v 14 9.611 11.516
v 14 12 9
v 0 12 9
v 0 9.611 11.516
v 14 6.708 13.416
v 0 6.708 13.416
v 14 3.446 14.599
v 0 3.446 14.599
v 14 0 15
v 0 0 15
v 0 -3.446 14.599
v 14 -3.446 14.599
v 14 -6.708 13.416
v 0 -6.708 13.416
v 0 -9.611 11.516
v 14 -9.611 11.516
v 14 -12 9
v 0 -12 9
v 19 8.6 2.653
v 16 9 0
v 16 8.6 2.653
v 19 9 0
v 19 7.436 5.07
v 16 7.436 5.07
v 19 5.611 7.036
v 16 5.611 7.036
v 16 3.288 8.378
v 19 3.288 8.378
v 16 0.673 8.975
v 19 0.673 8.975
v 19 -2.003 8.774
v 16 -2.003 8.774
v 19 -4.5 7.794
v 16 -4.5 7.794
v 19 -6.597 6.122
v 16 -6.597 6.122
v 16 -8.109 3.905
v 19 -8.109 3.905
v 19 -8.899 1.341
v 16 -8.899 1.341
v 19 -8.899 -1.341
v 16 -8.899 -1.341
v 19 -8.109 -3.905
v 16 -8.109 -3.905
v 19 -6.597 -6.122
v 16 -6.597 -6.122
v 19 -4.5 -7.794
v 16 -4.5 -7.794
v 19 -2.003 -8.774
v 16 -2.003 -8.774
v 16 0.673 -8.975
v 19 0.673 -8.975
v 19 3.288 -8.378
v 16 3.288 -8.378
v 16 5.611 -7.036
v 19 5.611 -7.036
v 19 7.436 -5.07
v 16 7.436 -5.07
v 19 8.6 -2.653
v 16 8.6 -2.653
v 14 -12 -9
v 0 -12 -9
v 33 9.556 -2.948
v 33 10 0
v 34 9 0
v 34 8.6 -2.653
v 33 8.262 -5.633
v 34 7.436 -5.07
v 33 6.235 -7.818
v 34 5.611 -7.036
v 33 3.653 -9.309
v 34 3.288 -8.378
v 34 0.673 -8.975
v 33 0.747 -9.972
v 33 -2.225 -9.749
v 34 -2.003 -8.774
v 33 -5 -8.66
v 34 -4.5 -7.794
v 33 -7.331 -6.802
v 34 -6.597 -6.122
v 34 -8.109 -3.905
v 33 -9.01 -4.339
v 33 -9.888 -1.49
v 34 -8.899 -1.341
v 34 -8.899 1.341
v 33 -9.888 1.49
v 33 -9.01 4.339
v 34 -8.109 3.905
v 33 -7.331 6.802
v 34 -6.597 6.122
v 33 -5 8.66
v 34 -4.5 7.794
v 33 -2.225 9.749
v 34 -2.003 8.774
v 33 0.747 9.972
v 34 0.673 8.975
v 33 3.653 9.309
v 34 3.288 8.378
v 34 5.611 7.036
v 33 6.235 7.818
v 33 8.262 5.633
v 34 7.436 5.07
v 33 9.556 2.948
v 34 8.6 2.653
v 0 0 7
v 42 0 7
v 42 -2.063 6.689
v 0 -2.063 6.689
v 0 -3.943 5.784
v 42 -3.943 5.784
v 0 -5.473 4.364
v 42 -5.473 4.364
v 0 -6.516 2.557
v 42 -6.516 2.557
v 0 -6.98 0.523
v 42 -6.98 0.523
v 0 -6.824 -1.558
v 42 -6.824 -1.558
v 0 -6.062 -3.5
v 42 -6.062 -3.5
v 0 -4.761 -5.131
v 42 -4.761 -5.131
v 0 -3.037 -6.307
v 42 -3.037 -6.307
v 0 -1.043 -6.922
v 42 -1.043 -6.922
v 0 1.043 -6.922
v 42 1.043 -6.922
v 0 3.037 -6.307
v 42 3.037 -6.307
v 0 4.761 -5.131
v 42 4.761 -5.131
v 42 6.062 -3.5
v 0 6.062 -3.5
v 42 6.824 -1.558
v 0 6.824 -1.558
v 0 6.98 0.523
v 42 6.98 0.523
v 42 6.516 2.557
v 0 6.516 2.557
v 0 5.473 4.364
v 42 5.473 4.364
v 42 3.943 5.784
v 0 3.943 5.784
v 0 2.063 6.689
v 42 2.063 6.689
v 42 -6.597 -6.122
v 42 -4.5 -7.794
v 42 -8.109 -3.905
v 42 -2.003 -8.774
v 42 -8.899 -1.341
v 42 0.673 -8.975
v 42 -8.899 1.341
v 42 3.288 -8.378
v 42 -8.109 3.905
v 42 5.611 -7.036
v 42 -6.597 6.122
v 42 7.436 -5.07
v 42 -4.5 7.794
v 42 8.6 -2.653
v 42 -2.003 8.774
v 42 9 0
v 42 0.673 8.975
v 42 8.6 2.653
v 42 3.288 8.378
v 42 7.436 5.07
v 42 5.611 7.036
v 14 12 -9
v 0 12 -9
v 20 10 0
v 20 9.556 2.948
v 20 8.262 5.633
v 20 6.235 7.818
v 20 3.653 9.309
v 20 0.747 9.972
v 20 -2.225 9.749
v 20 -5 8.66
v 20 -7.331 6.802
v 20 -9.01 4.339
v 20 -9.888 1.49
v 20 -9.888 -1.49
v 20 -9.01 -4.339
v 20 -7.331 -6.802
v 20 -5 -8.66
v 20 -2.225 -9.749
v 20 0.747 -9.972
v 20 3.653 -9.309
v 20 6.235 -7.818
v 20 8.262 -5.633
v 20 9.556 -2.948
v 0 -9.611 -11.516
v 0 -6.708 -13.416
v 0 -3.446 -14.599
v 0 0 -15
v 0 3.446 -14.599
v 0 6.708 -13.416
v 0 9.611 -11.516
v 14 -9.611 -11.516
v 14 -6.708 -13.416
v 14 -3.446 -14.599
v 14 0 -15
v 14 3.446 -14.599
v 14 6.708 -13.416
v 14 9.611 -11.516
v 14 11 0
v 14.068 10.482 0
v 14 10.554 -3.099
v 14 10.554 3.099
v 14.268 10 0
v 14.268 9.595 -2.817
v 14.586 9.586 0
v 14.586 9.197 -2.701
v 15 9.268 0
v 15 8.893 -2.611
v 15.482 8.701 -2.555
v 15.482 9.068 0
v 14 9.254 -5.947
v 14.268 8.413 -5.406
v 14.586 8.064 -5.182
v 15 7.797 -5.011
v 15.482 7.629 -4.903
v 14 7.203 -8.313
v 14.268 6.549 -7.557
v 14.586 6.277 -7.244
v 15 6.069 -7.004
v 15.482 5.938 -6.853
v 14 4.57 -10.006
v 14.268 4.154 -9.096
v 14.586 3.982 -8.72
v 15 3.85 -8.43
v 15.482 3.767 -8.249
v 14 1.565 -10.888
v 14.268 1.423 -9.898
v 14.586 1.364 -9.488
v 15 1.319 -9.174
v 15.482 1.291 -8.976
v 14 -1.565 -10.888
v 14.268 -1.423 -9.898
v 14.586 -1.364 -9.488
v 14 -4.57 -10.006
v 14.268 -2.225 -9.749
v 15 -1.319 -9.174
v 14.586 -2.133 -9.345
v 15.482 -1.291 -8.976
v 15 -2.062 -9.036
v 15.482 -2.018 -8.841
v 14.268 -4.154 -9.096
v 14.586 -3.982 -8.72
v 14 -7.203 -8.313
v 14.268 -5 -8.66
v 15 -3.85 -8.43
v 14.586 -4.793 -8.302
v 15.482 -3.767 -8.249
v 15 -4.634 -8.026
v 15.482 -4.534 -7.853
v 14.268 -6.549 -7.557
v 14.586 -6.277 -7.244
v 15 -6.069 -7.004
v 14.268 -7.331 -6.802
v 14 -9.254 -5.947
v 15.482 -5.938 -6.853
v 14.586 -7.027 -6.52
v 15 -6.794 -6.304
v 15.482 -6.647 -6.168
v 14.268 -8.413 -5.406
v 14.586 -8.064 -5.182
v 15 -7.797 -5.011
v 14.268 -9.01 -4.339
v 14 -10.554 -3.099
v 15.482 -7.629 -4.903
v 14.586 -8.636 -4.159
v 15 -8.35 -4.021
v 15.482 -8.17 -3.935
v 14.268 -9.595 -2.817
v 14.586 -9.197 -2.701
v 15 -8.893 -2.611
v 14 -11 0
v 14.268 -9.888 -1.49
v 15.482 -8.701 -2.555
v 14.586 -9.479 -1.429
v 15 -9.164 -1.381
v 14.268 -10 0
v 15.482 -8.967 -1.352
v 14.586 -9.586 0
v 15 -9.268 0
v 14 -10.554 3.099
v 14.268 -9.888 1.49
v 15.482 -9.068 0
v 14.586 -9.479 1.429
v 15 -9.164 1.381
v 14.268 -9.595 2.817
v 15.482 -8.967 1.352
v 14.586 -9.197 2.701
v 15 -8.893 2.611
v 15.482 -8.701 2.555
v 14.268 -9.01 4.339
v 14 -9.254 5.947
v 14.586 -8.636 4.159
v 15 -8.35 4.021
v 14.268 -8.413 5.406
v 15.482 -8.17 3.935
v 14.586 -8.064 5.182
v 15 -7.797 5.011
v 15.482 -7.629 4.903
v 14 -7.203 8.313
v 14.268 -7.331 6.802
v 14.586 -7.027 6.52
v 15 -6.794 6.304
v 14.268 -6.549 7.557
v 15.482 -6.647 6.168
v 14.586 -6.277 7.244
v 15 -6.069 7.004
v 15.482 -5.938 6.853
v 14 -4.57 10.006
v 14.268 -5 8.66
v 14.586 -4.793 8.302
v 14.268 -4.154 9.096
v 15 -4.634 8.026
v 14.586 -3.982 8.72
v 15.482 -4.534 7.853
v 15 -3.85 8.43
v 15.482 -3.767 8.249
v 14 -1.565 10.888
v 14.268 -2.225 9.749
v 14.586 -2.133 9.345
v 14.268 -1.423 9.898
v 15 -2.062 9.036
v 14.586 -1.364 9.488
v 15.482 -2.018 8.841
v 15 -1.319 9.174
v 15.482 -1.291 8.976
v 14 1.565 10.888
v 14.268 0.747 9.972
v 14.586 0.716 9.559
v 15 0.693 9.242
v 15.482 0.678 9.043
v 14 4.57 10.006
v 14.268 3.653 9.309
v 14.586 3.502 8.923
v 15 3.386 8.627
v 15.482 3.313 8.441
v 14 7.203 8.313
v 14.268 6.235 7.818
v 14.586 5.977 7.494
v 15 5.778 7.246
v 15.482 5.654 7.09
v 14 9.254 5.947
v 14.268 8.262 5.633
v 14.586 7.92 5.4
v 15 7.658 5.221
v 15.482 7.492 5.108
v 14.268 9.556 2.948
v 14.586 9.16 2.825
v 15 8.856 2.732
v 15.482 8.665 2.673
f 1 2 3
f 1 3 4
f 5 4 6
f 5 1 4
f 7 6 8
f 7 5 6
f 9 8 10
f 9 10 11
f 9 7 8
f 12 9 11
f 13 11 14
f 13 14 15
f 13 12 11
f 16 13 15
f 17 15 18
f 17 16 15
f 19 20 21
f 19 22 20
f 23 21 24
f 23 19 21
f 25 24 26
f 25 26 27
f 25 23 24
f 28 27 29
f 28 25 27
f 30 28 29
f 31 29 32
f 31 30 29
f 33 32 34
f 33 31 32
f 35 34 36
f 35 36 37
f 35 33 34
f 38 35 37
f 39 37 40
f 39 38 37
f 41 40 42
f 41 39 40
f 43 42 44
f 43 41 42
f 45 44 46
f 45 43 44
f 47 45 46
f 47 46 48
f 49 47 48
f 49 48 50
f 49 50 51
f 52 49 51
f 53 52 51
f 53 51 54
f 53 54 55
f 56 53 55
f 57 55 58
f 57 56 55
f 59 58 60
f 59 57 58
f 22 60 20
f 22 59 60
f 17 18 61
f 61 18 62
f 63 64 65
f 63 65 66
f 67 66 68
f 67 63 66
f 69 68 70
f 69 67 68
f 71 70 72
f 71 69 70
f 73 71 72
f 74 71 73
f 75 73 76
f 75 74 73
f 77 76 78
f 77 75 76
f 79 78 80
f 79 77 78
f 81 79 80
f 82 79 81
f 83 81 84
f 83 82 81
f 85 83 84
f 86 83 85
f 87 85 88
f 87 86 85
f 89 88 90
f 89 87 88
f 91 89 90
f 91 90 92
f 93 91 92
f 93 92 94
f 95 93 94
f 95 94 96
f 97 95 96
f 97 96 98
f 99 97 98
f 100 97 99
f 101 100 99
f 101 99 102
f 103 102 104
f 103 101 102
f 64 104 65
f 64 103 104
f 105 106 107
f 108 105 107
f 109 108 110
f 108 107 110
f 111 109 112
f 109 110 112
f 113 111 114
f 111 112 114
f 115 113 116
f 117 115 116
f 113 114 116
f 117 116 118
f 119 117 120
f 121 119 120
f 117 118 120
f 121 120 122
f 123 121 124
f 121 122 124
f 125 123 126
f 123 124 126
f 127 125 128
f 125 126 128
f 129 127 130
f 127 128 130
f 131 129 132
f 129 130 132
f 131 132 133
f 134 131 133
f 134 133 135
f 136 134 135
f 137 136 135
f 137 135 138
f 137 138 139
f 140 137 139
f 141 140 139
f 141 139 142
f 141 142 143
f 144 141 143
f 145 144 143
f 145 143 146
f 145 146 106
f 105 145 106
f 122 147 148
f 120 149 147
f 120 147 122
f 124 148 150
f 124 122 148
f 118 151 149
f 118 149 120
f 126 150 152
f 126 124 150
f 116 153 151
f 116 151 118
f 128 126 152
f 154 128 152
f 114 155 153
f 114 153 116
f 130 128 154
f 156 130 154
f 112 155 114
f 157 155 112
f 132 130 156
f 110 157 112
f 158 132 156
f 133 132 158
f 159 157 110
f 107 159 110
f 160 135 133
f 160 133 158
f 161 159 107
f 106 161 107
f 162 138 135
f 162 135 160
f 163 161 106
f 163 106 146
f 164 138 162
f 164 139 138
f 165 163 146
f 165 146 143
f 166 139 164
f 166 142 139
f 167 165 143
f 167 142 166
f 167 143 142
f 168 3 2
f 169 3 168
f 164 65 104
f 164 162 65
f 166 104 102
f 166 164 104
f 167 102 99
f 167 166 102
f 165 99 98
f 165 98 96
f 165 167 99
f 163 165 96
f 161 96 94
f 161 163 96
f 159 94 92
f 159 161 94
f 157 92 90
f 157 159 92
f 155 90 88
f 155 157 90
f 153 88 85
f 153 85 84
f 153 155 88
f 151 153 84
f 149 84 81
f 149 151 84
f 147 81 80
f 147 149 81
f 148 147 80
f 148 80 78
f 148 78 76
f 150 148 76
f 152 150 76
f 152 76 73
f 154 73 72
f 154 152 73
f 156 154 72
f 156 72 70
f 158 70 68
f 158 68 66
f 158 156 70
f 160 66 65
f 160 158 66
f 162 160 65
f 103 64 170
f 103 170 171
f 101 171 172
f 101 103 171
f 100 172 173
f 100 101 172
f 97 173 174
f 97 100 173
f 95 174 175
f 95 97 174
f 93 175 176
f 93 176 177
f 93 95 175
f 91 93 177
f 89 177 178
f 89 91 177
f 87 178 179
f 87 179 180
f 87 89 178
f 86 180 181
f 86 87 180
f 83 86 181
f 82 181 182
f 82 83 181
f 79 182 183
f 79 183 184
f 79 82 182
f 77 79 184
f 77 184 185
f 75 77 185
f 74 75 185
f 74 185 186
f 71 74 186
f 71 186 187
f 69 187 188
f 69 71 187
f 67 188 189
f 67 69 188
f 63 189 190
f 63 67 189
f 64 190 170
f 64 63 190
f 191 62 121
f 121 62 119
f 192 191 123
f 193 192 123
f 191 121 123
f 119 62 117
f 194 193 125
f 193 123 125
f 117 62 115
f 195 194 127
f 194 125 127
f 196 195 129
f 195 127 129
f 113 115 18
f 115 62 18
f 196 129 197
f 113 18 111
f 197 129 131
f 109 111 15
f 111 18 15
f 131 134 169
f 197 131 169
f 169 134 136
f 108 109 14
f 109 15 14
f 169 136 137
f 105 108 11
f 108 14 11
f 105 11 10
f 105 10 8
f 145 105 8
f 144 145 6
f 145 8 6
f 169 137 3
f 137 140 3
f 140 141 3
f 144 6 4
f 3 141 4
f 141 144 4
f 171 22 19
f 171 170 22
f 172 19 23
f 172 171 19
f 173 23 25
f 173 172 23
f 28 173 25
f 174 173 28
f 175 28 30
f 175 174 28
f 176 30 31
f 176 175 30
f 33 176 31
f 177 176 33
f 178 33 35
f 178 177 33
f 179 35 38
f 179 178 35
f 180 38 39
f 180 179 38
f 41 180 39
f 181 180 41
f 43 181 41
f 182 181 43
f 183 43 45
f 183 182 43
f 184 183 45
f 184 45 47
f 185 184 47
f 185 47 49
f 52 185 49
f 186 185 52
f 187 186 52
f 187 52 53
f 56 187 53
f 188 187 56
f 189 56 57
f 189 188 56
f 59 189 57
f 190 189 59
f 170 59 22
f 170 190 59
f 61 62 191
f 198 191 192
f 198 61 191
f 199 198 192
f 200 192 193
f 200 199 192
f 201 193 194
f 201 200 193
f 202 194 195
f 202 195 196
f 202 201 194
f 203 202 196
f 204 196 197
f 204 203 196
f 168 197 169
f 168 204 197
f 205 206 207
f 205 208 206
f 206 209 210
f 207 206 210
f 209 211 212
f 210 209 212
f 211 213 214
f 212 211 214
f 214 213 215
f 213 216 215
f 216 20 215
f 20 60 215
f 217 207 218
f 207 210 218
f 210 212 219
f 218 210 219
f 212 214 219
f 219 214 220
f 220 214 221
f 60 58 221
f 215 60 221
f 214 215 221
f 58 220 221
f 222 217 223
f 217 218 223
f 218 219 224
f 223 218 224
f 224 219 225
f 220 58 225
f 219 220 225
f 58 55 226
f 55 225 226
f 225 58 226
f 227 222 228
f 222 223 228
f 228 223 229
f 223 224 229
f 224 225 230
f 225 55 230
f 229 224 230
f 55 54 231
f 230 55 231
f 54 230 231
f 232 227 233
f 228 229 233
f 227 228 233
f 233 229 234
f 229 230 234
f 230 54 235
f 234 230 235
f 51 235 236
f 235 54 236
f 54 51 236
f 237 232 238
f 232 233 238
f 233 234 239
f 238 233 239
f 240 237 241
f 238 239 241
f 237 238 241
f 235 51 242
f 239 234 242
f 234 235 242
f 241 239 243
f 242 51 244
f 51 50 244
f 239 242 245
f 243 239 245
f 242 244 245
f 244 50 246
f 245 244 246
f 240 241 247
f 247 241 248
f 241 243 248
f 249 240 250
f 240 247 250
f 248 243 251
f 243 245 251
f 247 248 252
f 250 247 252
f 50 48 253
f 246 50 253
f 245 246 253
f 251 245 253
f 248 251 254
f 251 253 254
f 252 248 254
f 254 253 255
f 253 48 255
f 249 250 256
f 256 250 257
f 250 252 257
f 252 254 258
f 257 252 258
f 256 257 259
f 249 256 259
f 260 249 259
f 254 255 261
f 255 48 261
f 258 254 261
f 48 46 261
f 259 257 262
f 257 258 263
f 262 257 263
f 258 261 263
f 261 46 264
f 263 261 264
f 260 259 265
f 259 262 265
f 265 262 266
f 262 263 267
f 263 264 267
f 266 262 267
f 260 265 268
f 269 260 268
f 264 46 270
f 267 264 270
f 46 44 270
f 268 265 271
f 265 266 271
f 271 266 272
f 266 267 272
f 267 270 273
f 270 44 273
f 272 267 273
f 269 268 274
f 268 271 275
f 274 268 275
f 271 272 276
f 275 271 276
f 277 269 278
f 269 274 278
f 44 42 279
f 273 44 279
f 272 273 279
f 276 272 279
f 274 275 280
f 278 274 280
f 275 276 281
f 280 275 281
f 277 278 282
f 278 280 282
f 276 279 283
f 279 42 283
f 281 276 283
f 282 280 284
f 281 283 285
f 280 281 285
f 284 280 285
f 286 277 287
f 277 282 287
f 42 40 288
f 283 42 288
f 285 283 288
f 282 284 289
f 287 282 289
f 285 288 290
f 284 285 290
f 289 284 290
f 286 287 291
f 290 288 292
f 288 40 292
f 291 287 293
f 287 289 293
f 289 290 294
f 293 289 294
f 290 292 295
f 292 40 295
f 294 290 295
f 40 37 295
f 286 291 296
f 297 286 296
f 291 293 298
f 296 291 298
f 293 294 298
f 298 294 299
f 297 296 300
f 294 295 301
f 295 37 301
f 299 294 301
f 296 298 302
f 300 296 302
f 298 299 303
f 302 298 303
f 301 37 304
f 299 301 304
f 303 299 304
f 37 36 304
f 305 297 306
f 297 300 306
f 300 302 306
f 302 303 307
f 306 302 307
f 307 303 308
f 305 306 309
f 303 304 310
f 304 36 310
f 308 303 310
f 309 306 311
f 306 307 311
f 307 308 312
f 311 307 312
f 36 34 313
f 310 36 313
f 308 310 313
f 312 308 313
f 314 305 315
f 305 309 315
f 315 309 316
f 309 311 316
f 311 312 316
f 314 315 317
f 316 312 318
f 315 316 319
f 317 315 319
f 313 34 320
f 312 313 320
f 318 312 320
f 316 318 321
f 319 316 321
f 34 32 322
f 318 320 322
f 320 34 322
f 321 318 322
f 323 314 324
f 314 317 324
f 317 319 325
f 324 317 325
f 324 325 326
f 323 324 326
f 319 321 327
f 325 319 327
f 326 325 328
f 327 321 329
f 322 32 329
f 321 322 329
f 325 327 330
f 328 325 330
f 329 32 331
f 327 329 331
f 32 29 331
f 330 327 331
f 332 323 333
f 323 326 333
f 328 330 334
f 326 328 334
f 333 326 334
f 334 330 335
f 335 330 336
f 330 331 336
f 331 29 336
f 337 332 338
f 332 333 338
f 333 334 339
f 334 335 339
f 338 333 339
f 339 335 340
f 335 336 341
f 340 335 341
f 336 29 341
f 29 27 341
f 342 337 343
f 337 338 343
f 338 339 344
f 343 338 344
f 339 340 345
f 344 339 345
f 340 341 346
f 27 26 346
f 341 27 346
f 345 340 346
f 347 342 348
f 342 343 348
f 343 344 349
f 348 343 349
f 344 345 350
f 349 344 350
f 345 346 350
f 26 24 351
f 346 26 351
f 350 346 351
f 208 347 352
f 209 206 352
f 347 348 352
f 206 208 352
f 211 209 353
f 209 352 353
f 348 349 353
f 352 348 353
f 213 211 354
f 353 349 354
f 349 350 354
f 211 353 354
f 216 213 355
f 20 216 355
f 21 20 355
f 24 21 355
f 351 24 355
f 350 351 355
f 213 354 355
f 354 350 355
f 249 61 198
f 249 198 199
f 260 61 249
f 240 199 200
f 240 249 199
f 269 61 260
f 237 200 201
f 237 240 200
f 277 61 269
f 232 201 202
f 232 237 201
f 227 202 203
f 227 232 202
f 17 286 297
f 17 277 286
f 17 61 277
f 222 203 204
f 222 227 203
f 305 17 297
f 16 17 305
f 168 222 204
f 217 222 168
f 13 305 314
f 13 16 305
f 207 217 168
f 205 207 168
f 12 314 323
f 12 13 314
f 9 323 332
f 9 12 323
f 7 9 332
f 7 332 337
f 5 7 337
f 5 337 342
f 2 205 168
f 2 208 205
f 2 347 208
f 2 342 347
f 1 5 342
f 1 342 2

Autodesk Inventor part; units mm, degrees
ref_plane "YZ Plane" through (0, 0, 0) normal (1, 0, 0) x (0, 1, 0)
ref_plane "XZ Plane" through (0, 0, 0) normal (0, 1, 0) x (-1, 0, 0)
ref_plane "XY Plane" through (0, 0, 0) normal (0, 0, 1) x (1, 0, 0)
sketch "Skizze1" plane through (0, 0, 0) normal (0, 0, 1) x (1, 0, 0)
  line L0 (0, 0) -> (42, 0)
  line L1 (0, 0) -> (0, 15)
  line L2 (0, 15) -> (14, 15)
  line L3 (14, 15) -> (14, 9)
  line L4 (14, 9) -> (19, 9)
  line L5 (19, 9) -> (20, 10)
  line L6 (20, 10) -> (33, 10)
  line L7 (33, 10) -> (34, 9)
  line L8 (34, 9) -> (42, 9)
  line L9 (42, 9) -> (42, 0)
  dimension "d0" = 45
  dimension "d1" = 42
  dimension "d2" = 20
  dimension "d3" = 18
  dimension "d4" = 5
  dimension "d5" = 28
  dimension "d6" = 8
  dimension "d7" = 30
revolve "Umdrehung1" add sketch "Skizze1" angle 360 about axis through (0, 0, 0) along (1, 0, 0)
thread "Gewinde1" size "M20x2.5" class "6g" standard "ISO Metric profile" full length
sketch "Skizze2" plane through (0, 0, 0) normal (-1, 0, 0) x (0, 0, 1)
  circle A0 centre (0, 0) radius 15 projected
hole "Bohrung1" at (0, 0, 0) direction (1, 0, 0) diameter 14 depth 42
sketch "Skizze3" plane through (0, 0, 0) normal (-1, 0, 0) x (0, 0, 1)
  circle A0 centre (0, 0) radius 15 projected
  line L0 (9, 12) -> (-9, 12)
  circle A1 centre (0, 0) radius 15 projected
  line L1 (9, -12) -> (-9, -12)
  line L2 (15, 0) -> (-15, 0) construction
  point P0 (-9, -12)
  point P1 (-9, 12)
  dimension "d18" = 24
extrude "Extrusion1" cut sketch "Skizze3" against normal up to surface (14 mm away) contours L0 A0 | A0 L1
fillet "Rundung1" radius 2 1 edges at (14, -9, 0)
properties part number "Arbeitszylinder" material "Titan"
